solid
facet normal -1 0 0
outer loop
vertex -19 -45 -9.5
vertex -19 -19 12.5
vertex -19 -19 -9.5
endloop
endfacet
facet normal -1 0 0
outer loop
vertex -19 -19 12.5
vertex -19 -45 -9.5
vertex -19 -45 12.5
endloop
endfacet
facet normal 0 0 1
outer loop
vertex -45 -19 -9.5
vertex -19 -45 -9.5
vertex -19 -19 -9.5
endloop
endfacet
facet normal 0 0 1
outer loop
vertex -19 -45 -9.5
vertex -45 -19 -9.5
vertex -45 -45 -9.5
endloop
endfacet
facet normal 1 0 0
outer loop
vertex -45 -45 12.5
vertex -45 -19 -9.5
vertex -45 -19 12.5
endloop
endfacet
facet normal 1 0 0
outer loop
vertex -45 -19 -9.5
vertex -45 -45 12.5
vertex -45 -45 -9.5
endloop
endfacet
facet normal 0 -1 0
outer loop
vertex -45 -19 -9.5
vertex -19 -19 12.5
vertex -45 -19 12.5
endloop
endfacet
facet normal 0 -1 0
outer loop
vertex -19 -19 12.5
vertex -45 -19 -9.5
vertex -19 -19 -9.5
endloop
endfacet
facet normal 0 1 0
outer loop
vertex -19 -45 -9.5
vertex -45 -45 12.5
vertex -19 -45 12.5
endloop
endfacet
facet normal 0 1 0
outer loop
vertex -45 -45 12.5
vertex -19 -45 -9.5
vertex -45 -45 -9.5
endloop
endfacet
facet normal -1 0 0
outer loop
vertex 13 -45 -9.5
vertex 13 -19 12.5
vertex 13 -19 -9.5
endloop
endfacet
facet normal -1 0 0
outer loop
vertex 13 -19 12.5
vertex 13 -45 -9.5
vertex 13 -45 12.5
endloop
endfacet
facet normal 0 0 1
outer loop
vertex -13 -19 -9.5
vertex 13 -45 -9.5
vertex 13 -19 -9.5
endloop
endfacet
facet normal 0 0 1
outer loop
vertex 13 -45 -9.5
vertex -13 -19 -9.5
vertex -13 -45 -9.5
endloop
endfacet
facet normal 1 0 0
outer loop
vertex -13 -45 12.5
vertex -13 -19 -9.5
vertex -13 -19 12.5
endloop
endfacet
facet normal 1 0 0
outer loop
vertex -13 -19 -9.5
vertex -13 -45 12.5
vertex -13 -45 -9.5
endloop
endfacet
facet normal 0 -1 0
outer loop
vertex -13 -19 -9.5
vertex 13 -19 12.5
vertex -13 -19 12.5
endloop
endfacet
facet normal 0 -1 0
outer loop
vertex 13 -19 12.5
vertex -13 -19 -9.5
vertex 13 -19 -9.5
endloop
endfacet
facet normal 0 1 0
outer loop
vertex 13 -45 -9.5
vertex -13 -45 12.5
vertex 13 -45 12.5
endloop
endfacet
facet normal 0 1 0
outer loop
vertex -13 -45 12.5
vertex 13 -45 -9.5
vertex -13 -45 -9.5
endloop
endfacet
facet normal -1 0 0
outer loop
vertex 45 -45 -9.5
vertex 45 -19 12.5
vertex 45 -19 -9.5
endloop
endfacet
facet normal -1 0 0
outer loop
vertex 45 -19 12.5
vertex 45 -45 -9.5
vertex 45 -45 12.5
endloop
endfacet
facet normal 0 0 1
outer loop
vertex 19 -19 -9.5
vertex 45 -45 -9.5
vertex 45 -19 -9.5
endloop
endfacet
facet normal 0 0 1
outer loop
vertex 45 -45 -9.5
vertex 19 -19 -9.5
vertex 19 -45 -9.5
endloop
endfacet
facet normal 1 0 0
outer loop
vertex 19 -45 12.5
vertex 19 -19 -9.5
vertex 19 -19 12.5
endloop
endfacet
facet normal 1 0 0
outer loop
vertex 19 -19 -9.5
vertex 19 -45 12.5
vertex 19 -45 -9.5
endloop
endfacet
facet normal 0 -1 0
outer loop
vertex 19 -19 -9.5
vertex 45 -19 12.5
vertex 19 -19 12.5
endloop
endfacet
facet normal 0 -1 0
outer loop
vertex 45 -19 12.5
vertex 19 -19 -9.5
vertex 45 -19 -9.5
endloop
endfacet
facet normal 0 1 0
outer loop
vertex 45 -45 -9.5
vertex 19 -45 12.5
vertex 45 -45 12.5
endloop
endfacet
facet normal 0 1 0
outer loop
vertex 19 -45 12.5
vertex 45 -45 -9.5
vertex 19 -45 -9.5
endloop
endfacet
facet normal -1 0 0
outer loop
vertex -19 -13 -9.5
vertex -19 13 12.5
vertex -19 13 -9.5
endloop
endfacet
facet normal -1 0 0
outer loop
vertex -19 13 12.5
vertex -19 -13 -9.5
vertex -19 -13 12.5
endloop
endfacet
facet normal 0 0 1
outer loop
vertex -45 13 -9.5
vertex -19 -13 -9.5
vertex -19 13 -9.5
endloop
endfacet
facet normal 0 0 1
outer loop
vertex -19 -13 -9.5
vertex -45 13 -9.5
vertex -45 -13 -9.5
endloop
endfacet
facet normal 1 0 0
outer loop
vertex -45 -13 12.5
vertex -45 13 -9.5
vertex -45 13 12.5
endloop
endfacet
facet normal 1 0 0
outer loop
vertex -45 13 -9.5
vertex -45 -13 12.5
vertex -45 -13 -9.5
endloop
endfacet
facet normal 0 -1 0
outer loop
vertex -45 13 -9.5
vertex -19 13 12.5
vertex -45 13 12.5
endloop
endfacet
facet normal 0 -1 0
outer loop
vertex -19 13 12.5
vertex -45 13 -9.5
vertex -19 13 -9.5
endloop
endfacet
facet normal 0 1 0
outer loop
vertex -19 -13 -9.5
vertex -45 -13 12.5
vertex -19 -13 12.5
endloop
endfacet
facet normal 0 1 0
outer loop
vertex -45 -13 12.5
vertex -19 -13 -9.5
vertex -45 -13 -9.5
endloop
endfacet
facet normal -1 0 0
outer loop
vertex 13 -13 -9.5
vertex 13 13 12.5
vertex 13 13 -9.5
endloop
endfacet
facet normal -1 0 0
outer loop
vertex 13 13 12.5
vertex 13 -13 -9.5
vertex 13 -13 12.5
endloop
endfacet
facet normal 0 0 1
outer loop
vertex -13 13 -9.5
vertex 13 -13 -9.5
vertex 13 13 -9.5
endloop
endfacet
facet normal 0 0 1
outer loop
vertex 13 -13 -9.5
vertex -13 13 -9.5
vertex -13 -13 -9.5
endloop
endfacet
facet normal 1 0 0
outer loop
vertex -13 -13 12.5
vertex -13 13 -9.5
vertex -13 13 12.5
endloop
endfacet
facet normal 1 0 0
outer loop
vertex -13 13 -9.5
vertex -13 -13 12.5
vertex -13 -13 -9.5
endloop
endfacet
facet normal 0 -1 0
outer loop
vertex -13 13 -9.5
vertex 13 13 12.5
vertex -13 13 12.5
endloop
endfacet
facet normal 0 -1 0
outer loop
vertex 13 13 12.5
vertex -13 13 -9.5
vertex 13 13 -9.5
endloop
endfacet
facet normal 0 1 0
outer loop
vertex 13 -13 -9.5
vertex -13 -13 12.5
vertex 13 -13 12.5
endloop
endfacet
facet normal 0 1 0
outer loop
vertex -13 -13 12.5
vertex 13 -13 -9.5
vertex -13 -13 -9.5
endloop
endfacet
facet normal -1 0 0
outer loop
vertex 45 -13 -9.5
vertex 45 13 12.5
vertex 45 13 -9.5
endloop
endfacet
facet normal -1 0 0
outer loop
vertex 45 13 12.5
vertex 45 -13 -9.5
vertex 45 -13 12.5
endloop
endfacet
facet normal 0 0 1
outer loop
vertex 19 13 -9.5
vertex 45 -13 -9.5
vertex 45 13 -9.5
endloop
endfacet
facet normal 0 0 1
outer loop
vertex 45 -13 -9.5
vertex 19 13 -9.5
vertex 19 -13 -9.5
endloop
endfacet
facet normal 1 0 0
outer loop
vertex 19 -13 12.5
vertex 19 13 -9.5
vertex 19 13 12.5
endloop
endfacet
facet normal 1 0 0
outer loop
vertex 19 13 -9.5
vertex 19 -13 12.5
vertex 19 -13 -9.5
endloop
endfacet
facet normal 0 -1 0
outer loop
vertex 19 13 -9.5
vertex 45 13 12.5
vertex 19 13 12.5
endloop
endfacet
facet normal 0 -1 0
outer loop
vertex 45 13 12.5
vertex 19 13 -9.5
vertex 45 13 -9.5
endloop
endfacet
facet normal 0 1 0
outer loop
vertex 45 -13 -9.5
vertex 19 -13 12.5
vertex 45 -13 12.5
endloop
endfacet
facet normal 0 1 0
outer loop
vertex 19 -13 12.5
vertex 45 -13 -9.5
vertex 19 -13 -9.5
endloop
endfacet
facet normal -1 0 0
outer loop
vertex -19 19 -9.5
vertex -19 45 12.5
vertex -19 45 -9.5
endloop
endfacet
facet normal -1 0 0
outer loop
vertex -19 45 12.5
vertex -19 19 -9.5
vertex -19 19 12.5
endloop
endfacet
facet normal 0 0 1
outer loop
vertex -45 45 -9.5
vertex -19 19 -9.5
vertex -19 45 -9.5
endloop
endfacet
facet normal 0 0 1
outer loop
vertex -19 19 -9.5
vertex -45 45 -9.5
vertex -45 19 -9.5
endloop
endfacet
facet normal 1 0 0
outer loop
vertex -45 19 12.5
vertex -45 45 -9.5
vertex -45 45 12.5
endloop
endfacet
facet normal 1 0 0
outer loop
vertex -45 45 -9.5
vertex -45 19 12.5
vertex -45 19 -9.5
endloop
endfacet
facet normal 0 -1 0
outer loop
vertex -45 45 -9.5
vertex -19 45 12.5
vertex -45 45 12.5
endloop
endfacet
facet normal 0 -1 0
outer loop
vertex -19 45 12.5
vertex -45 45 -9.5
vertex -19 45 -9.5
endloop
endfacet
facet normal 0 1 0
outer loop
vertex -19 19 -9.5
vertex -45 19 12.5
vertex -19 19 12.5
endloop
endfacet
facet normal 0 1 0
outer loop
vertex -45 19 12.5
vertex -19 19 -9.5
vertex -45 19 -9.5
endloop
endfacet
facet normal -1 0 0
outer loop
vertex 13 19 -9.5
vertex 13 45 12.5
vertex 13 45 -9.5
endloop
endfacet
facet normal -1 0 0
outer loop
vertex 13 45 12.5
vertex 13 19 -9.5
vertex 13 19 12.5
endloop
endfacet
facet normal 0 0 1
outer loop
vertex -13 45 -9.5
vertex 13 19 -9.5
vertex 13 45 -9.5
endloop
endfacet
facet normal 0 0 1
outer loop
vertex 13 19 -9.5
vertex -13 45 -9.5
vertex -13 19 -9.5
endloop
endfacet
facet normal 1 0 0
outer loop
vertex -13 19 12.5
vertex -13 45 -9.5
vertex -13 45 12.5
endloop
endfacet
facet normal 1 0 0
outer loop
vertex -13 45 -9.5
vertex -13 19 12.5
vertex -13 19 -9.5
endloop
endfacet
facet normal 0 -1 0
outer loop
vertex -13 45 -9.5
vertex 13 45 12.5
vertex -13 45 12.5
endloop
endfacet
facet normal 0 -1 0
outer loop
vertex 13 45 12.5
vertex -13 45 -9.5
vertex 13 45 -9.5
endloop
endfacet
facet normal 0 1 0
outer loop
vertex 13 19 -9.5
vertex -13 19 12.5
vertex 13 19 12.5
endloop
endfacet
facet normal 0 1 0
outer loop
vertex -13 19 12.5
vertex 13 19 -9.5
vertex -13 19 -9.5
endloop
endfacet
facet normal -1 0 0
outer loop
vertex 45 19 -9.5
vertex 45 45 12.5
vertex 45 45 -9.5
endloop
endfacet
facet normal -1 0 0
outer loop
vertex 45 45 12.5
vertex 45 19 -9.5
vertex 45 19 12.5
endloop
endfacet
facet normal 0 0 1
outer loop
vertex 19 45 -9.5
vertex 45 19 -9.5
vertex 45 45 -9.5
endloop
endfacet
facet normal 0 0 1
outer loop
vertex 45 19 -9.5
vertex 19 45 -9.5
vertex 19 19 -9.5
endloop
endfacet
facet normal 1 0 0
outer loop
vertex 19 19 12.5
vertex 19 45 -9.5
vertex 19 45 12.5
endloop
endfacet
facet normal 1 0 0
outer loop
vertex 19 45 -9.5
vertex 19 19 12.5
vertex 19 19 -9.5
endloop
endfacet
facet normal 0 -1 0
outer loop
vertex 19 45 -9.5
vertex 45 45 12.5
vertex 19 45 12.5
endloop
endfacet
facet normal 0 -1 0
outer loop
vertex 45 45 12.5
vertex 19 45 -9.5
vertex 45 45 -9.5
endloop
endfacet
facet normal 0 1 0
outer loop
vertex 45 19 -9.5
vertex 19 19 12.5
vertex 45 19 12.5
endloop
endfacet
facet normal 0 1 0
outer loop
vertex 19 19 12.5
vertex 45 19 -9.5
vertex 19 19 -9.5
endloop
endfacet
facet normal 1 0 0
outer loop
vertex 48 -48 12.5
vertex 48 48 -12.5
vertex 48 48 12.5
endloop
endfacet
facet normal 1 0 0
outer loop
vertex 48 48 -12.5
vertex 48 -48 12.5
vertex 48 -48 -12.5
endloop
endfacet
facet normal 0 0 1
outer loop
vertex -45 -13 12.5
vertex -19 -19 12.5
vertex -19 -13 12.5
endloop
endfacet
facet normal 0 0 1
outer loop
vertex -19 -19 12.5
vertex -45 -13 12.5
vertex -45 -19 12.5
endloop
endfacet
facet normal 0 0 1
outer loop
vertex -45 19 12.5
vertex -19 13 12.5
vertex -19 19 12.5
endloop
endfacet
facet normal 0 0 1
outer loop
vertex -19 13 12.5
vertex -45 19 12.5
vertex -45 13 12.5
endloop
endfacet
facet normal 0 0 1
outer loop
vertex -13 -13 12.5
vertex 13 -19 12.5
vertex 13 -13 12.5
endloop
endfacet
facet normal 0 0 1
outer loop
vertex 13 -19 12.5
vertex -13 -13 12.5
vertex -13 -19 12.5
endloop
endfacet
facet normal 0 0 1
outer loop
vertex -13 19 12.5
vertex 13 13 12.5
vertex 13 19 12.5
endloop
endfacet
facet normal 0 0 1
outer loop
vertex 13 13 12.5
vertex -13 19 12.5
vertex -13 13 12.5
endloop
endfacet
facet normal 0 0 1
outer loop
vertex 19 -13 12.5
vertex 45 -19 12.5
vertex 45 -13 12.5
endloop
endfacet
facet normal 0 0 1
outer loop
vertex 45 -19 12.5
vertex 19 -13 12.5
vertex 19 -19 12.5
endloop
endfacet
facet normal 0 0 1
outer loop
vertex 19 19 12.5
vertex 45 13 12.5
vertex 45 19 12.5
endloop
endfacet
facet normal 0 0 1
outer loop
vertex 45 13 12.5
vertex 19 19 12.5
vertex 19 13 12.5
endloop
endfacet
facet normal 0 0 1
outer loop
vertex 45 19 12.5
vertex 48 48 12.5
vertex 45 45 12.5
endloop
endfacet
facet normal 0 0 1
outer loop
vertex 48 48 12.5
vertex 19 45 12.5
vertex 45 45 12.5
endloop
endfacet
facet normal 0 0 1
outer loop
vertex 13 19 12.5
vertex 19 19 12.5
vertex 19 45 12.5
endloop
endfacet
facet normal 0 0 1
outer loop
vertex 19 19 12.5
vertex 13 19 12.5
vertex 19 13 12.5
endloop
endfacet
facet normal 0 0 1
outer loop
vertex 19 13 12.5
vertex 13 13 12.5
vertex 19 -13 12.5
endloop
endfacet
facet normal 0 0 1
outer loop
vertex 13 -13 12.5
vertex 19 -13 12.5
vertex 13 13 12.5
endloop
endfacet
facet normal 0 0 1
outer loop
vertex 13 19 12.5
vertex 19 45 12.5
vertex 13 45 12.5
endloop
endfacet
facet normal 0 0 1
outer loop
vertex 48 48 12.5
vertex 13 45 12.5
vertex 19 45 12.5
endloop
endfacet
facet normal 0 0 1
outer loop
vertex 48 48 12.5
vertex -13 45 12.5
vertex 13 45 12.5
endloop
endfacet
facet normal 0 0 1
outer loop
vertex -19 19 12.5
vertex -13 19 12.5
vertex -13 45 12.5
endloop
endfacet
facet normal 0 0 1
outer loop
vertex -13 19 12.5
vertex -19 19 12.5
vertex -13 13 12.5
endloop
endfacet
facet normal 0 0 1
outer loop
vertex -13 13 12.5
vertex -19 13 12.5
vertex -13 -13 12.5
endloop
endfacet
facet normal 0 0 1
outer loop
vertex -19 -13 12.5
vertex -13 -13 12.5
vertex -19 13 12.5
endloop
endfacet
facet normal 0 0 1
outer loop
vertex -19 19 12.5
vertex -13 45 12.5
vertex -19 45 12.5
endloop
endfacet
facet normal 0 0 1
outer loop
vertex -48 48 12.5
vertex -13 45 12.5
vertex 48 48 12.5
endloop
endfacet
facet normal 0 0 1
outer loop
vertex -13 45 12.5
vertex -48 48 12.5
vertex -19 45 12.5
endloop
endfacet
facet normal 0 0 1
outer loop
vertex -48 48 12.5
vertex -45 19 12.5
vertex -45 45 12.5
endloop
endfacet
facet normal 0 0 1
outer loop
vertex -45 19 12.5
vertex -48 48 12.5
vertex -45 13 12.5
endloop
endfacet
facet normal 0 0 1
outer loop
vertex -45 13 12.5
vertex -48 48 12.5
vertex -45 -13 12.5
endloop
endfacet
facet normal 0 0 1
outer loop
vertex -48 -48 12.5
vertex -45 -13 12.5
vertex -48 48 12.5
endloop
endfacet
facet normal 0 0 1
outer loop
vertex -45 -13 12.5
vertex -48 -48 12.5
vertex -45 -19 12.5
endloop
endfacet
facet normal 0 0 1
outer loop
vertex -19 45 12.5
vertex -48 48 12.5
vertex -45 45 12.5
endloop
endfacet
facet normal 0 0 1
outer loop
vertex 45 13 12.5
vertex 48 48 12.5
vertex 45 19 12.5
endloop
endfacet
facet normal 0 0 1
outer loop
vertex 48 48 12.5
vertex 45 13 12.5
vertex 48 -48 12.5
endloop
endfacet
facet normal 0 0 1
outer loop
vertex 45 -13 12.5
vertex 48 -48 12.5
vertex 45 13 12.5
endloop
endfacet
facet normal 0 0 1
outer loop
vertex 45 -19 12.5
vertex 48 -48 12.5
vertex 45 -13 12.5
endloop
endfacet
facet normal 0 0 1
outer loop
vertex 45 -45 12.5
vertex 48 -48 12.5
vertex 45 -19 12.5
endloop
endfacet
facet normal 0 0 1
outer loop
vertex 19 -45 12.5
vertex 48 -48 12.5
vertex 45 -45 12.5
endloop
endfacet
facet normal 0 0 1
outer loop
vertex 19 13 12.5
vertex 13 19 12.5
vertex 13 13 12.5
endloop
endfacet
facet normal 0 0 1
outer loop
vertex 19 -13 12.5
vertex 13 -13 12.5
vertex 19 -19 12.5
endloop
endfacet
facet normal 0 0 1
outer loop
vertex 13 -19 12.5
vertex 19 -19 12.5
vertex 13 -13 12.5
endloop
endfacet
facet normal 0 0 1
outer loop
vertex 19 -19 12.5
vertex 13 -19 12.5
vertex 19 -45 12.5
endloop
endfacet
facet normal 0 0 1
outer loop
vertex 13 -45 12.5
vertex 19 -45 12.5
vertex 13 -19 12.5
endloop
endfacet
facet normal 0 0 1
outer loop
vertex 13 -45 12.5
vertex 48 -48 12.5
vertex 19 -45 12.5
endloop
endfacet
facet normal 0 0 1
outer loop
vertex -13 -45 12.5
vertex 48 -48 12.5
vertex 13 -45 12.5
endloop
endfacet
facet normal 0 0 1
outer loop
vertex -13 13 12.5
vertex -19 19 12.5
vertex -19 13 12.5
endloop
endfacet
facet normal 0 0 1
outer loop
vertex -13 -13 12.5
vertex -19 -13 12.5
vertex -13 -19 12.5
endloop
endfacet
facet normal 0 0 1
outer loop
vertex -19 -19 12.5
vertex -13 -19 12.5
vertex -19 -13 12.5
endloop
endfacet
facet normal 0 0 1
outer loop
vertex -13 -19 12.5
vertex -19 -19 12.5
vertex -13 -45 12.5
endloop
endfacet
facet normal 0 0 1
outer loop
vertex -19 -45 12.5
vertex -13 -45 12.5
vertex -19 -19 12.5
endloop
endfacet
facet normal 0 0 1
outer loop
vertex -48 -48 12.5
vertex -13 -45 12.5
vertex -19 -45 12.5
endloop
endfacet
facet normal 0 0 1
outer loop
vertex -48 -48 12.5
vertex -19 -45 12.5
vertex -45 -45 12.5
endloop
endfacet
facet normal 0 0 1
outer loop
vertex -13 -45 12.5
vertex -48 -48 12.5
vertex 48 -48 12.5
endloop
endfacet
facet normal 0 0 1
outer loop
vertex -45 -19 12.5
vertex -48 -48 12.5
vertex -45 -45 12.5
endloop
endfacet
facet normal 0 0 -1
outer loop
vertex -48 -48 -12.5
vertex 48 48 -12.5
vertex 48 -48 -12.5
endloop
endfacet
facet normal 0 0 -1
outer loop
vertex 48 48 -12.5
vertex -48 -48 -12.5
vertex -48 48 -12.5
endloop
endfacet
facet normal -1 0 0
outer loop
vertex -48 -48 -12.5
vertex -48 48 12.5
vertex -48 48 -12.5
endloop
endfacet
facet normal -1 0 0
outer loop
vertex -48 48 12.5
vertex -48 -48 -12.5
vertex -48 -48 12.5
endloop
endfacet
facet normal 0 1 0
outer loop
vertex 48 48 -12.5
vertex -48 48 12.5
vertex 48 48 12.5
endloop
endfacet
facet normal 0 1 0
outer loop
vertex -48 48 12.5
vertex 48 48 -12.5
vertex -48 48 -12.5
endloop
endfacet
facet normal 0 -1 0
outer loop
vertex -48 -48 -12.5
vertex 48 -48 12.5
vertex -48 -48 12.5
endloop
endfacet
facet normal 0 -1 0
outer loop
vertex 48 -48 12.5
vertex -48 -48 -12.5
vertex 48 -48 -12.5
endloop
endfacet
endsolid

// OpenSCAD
$fn = 32;

// ----------------------------------------------------------------------
// Pocket plate 96 x 96 x 25
// 3 x 3 pockets 26 mm square, 22 mm deep
// ----------------------------------------------------------------------

// --- parameters (mm) ---
thickness = 25;  // plate thickness
floor_t = 3;     // material left under each pocket
pocket = 26;     // pocket side length
pitch_x = 32;    // pocket pitch along X
pitch_y = 32;    // pocket pitch along Y
cols = 3;        // pockets per row
rows = 3;        // rows of pockets

// --- derived feature positions (mm) ---
depth = thickness - floor_t;        // = 22   pocket depth, down to the floor
span_x = (cols - 1) * pitch_x;      // = 64   distance between outer pockets
span_y = (rows - 1) * pitch_y;      // = 64   distance between outer pocket rows
origin_x = -span_x / 2;             // = -32   X of the first pocket
origin_y = -span_y / 2;             // = -32   Y of the first pocket
plate = [span_x + pocket + 6, span_y + pocket + 6, thickness];  // = [96, 96, 25]   overall size: pockets plus 3 mm of wall on each side
feature_centers = [
  [origin_x + 0 * pitch_x, origin_y + 0 * pitch_y],
  [origin_x + 1 * pitch_x, origin_y + 0 * pitch_y],
  [origin_x + 2 * pitch_x, origin_y + 0 * pitch_y],
  [origin_x + 0 * pitch_x, origin_y + 1 * pitch_y],
  [origin_x + 1 * pitch_x, origin_y + 1 * pitch_y],
  [origin_x + 2 * pitch_x, origin_y + 1 * pitch_y],
  [origin_x + 0 * pitch_x, origin_y + 2 * pitch_y],
  [origin_x + 1 * pitch_x, origin_y + 2 * pitch_y],
  [origin_x + 2 * pitch_x, origin_y + 2 * pitch_y]
];   // pocket centres, used verbatim by the cutter loop

// plate outline, then one pocket per centre in feature_centers
difference() {
  cube(plate, center = true);
  for (centre = feature_centers)
    translate([centre[0] - pocket / 2, centre[1] - pocket / 2, plate[2] / 2 - depth])
      cube([pocket, pocket, depth + 1]);  // centred on the declared pocket centre
}
